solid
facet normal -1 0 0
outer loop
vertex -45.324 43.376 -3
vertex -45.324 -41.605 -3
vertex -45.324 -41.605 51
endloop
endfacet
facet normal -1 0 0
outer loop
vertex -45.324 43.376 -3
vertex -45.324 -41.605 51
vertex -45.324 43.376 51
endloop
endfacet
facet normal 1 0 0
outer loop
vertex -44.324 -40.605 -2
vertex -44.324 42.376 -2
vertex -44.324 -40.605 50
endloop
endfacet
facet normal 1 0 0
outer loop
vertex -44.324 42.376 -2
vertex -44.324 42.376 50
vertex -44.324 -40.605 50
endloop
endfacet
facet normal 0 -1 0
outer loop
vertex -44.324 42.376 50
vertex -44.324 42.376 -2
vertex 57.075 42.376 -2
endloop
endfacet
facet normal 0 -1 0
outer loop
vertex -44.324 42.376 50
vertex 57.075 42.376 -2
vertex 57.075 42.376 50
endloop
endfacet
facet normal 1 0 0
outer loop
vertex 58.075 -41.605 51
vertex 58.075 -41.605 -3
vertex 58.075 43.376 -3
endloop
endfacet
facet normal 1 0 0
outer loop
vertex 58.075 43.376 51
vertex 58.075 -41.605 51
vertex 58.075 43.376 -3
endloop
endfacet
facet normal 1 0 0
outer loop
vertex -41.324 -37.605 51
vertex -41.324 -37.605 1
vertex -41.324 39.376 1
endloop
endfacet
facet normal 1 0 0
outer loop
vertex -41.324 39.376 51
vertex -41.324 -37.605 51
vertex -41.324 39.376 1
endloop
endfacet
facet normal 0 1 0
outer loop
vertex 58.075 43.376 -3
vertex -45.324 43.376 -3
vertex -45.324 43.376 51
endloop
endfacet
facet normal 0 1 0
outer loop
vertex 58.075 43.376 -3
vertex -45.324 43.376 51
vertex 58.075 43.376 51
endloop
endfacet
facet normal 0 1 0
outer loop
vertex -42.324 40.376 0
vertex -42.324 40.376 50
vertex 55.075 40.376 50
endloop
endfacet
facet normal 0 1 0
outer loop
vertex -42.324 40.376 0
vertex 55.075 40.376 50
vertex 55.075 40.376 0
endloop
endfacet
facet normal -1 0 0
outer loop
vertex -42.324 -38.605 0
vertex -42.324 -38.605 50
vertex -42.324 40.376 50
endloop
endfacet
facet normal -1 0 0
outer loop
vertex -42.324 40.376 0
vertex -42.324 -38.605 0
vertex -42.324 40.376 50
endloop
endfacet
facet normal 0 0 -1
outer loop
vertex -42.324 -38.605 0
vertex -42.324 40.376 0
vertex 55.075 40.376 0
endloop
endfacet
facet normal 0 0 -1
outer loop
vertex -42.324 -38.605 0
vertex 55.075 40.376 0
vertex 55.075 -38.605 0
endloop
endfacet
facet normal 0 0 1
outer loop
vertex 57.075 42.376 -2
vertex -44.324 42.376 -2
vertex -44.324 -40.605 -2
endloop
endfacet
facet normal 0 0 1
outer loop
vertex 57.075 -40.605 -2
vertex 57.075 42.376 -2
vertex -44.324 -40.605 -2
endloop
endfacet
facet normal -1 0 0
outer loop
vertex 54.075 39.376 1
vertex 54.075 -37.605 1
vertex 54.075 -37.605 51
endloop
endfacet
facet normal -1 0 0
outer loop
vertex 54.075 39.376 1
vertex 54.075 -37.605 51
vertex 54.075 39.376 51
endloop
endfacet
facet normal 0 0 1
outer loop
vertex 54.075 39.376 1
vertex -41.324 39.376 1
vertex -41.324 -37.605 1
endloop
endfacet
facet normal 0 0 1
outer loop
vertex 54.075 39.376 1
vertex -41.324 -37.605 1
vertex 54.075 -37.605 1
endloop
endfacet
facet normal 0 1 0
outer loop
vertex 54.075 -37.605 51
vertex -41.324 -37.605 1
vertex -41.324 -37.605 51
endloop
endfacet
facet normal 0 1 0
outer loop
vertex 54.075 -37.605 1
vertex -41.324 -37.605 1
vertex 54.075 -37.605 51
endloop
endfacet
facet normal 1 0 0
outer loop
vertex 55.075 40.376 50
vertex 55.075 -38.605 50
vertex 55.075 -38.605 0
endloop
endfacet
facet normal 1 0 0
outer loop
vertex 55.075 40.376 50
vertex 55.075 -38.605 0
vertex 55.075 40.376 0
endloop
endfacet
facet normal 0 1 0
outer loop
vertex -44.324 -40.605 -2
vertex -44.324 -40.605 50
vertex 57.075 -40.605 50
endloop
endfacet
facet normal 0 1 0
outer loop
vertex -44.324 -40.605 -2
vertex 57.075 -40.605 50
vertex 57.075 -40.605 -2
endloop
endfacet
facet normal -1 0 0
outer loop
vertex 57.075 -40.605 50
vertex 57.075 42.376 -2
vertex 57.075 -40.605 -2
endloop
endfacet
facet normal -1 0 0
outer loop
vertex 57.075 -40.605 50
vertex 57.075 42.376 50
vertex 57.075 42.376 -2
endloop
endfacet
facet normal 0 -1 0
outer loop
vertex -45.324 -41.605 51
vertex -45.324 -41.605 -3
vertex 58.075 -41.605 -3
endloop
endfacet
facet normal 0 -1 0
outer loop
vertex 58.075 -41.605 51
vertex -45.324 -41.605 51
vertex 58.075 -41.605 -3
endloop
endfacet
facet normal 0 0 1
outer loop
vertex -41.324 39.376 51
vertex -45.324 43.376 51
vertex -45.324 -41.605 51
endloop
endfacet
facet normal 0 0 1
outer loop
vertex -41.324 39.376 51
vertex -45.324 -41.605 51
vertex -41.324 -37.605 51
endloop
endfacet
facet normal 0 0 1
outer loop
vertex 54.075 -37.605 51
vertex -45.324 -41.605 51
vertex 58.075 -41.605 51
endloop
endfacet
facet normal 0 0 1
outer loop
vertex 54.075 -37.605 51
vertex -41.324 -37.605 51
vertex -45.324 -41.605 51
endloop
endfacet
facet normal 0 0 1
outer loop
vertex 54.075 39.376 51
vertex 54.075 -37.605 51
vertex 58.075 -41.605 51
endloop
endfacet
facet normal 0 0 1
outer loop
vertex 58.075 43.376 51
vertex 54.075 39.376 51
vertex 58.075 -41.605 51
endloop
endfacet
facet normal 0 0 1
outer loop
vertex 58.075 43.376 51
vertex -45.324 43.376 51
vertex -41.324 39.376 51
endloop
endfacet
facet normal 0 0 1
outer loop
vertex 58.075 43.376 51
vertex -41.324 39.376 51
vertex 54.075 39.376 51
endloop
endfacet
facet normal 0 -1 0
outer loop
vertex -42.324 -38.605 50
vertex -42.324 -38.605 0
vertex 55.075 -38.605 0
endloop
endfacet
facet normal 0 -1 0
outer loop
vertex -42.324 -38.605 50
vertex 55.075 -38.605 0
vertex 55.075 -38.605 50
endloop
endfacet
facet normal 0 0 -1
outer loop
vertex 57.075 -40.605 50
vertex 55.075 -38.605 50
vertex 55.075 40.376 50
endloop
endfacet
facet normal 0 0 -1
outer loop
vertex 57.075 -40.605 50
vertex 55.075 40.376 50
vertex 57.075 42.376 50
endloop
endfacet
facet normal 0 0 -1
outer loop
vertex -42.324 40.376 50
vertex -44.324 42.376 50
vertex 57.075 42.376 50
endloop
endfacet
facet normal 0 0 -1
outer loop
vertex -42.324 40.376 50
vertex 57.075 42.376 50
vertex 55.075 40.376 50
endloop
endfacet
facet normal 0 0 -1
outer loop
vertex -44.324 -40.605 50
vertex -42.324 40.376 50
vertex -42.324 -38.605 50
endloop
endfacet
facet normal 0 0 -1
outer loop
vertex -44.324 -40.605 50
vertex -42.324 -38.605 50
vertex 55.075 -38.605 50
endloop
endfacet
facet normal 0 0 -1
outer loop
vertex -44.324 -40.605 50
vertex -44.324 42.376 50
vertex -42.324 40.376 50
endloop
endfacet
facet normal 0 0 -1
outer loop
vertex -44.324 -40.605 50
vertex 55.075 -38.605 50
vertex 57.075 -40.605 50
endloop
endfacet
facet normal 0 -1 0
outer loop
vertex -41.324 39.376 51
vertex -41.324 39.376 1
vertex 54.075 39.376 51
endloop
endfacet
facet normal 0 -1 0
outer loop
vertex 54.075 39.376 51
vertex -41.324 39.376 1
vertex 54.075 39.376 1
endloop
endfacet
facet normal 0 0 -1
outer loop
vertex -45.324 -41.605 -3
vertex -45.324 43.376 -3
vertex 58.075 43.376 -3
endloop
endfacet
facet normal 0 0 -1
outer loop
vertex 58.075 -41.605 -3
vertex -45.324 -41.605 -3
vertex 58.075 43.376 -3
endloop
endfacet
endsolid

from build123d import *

# Parameters (mm, degrees)
SHEET_EXTRUDE_1_2_DEPTH = 50
SKETCH_1_2_W            = 97.399040294
SKETCH_1_2_H            = 78.98176722
THICKEN_1_T1            = 2
SHELL_START             = -3.0000001
SHELL_1_OUTLINE_W       = 103.399040294
SHELL_1_OUTLINE_H       = 84.98176722
SHELL_1_OUTLINE_W_2     = 95.399040294
SHELL_1_OUTLINE_H_2     = 76.98176722
SHELL_1_DEPTH           = 54.0000001
SHELL_1_2_OUTLINE_W     = 95.399040294
SHELL_1_2_OUTLINE_H     = 76.98176722
SHELL_1_2_DEPTH         = 4.0000001
SHELL_START_2           = -44.324310237
SHELL_1_3_DEPTH         = 101.399040294
SHELL_1_4_OUTLINE_W     = 78.98176722
SHELL_1_4_OUTLINE_H     = 50
SHELL_1_4_DEPTH         = 2
SHELL_START_3           = 55.074730057
SHELL_1_5_OUTLINE_W     = 78.98176722
SHELL_1_5_OUTLINE_H     = 50
SHELL_1_5_DEPTH         = 2


with BuildPart() as body_1:
    # Sheet Extrude 1: a surface, the sketch's curves swept straight by 50 mm
    with BuildLine(Plane.XY, mode=Mode.PRIVATE) as sheet_extrude_1_2_path:
        Line((-42.324310237, 40.376329431), (55.074730057, 40.376329431))
        Line((55.074730057, 40.376329431), (55.074730057, -38.605437789))
        Line((55.074730057, -38.605437789), (-42.324310237, -38.605437789))
        Line((-42.324310237, -38.605437789), (-42.324310237, 40.376329431))
    sheet_extrude_1_2 = Shell.extrude(sheet_extrude_1_2_path.wire(), (0 * SHEET_EXTRUDE_1_2_DEPTH, 0 * SHEET_EXTRUDE_1_2_DEPTH, 1 * SHEET_EXTRUDE_1_2_DEPTH))
    # Эскиз1<2> → Sheet Fill 1: a flat surface bounded by the sketch
    with BuildSketch(Plane.XY, mode=Mode.PRIVATE) as sheet_fill_1_3_region:
        with Locations((6.37520991, 0.885445821)):
            Rectangle(SKETCH_1_2_W, SKETCH_1_2_H)
    sheet_fill_1_3 = sheet_fill_1_3_region.sketch.faces()[0]
    # Knit 1: the surfaces knitted into one
    knit_1_1 = Shell(Face.sew_faces(sheet_extrude_1_2.faces() + sheet_fill_1_3.faces())[0])
    add(Solid.thicken(knit_1_1, THICKEN_1_T1))

    # Оболочка1: read off the stored shape, not the designer's step
    # Оболочка1 outline → Оболочка1 (add)
    with BuildSketch(Plane.XY.offset(SHELL_START)):
        with Locations((6.37520991, 0.885445821)):
            Rectangle(SHELL_1_OUTLINE_W, SHELL_1_OUTLINE_H)
        with Locations((6.37520991, 0.885445821)):
            Rectangle(SHELL_1_OUTLINE_W_2, SHELL_1_OUTLINE_H_2, mode=Mode.SUBTRACT)
    extrude(amount=SHELL_1_DEPTH)

    # Shell 1 2 outline → Shell 1 2 (add)
    with BuildSketch(Plane.XY.offset(SHELL_START)):
        with Locations((6.37520991, 0.885445821)):
            Rectangle(SHELL_1_2_OUTLINE_W, SHELL_1_2_OUTLINE_H)
    extrude(amount=SHELL_1_2_DEPTH)

    # Shell 1 3 outline → Shell 1 3 (cut)
    with BuildSketch(Plane.YZ.offset(SHELL_START_2)):
        with BuildLine():
            add(Edge.make_bspline(
                [(42.376329431, -2), (-40.605437789, -2)],
                knots=[-0.0253223, -0.0253223, 1.0253223, 1.0253223], degree=1))
            Line((42.376329431, -2), (42.376329431, 50))
            Line((42.376329431, 50), (40.376329431, 50))
            Line((40.376329431, 50), (40.376329431, 0))
            Line((40.376329431, 0), (-38.605437789, 0))
            Line((-38.605437789, 0), (-38.605437789, 50))
            Line((-38.605437789, 50), (-40.605437789, 50))
            Line((-40.605437789, 50), (-40.605437789, -2))
        make_face()
    extrude(amount=SHELL_1_3_DEPTH, mode=Mode.SUBTRACT)

    # Shell 1 4 outline → Shell 1 4 (cut)
    with BuildSketch(Plane.YZ.offset(SHELL_START_2)):
        with Locations((0.885445821, 25)):
            Rectangle(SHELL_1_4_OUTLINE_W, SHELL_1_4_OUTLINE_H)
    extrude(amount=SHELL_1_4_DEPTH, mode=Mode.SUBTRACT)

    # Shell 1 5 outline → Shell 1 5 (cut)
    with BuildSketch(Plane.YZ.offset(SHELL_START_3)):
        with Locations((0.885445821, 25)):
            Rectangle(SHELL_1_5_OUTLINE_W, SHELL_1_5_OUTLINE_H)
    extrude(amount=SHELL_1_5_DEPTH, mode=Mode.SUBTRACT)


solid = body_1.part
